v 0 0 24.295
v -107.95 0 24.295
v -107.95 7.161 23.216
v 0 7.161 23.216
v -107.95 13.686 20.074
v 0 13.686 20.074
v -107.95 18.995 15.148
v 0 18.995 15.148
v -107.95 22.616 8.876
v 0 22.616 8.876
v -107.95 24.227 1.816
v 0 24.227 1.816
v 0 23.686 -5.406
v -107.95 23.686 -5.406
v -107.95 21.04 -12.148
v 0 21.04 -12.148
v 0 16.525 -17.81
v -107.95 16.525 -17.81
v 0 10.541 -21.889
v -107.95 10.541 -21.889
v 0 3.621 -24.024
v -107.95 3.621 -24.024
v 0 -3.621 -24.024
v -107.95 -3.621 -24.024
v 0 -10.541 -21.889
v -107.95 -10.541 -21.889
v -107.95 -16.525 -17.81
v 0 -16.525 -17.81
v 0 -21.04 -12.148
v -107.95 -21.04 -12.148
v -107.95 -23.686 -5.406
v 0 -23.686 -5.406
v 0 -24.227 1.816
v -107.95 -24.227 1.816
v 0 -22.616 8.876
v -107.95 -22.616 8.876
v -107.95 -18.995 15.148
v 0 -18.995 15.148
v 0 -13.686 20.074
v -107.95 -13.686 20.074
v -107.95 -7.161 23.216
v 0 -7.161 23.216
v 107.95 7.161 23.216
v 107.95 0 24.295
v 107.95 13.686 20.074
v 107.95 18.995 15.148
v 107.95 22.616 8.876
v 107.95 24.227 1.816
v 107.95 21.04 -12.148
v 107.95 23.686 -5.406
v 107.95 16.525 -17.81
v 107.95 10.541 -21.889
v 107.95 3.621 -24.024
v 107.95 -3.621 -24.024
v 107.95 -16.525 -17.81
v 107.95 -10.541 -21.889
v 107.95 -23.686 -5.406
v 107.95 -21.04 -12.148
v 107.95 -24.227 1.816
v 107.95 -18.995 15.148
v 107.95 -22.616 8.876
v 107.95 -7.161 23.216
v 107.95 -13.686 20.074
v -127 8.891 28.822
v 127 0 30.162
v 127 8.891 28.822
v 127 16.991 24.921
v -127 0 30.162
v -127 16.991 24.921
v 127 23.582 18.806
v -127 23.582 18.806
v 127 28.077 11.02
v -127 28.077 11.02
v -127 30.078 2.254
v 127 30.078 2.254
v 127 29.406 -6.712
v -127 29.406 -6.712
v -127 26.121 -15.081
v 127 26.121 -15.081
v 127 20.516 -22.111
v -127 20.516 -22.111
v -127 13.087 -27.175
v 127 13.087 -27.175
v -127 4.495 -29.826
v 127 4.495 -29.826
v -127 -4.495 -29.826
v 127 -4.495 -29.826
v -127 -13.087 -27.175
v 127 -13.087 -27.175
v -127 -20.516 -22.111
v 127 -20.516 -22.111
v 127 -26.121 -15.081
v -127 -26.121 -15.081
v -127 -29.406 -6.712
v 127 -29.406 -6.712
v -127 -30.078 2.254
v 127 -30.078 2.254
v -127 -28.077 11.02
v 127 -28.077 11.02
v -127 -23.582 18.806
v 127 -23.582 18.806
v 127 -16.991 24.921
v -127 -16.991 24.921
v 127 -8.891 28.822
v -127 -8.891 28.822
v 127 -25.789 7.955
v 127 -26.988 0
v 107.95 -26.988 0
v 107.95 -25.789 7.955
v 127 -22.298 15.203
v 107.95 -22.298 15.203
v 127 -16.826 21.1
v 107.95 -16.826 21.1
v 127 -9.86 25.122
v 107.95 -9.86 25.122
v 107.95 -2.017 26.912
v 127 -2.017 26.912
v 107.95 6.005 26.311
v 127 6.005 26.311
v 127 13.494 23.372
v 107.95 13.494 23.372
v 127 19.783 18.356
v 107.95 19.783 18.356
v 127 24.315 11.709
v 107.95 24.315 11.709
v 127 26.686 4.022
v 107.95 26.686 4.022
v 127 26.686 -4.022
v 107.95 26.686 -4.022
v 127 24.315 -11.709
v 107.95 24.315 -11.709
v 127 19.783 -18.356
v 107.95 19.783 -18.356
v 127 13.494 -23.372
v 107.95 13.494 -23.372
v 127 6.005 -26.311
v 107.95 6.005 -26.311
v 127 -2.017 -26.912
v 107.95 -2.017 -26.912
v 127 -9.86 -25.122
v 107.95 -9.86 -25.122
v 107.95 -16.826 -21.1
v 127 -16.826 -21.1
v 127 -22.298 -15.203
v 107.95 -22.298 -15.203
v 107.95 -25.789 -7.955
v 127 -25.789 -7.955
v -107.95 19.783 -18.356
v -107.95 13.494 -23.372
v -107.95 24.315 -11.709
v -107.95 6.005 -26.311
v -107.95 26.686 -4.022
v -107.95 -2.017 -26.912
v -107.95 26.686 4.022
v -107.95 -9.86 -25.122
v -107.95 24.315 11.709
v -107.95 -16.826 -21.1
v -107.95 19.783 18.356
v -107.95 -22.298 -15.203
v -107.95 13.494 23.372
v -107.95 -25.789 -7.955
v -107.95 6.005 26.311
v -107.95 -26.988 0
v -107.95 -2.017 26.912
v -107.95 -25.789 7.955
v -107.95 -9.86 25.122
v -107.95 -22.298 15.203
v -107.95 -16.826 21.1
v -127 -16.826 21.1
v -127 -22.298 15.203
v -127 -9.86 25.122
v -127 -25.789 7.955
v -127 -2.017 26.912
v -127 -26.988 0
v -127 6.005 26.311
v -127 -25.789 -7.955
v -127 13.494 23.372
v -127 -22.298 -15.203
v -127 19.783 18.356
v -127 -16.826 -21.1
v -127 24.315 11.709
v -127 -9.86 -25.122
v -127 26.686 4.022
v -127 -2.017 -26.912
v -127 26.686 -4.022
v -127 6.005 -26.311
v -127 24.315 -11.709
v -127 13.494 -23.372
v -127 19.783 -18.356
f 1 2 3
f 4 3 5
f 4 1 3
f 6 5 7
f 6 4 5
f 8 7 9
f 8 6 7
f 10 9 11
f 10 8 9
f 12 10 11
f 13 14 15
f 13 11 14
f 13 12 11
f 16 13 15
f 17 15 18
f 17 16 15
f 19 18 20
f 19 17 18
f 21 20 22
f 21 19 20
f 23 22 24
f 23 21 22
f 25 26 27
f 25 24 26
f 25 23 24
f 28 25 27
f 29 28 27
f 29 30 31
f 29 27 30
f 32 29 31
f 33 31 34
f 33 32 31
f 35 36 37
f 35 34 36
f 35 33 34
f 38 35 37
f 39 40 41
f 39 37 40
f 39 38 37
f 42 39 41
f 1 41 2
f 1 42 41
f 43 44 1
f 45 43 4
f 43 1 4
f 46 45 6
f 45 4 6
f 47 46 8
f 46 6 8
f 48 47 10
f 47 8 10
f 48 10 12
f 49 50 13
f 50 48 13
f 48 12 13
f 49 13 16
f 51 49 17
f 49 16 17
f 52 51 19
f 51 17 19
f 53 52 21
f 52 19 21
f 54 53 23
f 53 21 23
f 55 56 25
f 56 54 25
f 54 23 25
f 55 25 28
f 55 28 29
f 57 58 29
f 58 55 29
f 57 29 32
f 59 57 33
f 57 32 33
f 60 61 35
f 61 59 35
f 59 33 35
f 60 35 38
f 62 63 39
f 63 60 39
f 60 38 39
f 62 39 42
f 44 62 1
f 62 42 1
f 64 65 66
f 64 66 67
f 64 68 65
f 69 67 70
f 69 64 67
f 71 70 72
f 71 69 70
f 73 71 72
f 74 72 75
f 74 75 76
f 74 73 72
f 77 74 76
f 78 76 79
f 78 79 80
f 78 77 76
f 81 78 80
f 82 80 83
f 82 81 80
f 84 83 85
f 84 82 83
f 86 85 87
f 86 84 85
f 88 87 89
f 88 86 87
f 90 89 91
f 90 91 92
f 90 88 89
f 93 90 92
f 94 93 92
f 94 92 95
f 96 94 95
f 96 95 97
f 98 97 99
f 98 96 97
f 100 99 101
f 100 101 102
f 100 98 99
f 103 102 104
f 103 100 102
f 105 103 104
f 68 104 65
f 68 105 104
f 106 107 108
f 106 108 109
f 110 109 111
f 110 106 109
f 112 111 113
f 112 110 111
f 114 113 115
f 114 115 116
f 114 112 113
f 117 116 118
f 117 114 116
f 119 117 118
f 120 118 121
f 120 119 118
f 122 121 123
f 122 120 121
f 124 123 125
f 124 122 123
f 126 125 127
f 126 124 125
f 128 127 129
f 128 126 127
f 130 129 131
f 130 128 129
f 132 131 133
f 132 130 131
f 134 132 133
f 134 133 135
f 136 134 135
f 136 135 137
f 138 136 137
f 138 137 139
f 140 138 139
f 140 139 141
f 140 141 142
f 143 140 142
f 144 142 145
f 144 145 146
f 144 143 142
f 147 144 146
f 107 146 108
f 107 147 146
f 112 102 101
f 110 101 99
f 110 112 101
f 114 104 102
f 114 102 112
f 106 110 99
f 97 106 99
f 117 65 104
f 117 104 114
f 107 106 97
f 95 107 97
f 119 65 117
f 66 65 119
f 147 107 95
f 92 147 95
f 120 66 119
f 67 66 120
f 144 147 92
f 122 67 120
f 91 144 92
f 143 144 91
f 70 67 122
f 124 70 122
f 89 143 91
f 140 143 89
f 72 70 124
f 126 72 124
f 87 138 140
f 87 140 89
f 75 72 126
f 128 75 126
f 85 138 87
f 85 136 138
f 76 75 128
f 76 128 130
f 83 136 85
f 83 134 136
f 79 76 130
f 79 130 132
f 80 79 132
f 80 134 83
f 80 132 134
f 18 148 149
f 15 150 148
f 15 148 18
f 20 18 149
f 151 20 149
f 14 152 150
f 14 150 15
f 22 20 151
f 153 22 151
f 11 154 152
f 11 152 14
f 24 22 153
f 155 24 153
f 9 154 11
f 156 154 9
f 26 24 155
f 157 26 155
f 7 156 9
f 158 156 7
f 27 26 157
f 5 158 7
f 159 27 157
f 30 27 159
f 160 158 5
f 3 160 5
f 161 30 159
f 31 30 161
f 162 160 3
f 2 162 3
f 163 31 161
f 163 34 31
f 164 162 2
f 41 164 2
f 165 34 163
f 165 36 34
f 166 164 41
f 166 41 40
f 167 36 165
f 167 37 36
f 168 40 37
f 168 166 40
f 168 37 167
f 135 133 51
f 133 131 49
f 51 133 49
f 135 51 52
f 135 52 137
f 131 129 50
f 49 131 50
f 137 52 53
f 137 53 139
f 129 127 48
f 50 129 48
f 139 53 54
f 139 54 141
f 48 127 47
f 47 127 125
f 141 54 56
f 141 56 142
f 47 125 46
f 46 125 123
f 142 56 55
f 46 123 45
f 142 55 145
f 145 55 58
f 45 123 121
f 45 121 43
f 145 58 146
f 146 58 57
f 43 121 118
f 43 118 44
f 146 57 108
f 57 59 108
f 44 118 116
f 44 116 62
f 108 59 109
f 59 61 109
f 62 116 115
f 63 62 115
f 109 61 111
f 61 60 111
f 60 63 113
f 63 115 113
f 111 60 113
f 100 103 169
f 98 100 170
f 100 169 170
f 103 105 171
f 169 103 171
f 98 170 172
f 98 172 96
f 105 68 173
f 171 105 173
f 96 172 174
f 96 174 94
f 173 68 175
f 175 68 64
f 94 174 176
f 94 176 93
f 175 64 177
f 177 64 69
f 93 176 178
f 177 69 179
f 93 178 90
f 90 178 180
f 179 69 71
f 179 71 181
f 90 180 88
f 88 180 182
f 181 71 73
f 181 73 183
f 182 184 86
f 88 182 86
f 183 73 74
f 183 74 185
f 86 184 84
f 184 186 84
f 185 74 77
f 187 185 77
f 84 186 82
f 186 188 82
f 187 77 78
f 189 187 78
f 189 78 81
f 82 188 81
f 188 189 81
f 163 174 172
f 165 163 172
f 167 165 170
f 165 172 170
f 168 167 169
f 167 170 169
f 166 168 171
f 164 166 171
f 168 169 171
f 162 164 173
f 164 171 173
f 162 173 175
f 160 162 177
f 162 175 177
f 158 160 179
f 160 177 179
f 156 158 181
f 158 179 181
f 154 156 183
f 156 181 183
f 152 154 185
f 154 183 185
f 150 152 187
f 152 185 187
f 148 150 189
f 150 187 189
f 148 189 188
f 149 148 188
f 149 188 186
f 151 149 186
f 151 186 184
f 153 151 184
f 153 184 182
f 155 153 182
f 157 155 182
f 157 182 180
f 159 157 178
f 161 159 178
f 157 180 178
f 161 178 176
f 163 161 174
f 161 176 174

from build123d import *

# Parameters (mm, degrees)
F0_W     = 127
F0_H     = 5.8674
F2_R     = 26.9875
F3_DEPTH = 19.05


with BuildPart() as f1:
    # F0 (on Front) → F1 (revolve)
    with BuildSketch(Plane.XZ):
        with Locations((-63.5, 27.2288)):
            Rectangle(F0_W, F0_H)
    revolve(axis=Axis((-63.5, 0, 0), (-1, 0, 0)))

    # F2 (on face) → F3 (cut)
    with BuildSketch(Plane(origin=(-127, 0, 0), x_dir=(0, -1, 0), z_dir=(-1, 0, 0))):
        Circle(F2_R)
    extrude(amount=-F3_DEPTH, mode=Mode.SUBTRACT)

    # F4: F1 across plane


with BuildPart() as f1_1:
    add(f1.part)
    add(f1.part.mirror(Plane.YZ))


solid = f1_1.part
